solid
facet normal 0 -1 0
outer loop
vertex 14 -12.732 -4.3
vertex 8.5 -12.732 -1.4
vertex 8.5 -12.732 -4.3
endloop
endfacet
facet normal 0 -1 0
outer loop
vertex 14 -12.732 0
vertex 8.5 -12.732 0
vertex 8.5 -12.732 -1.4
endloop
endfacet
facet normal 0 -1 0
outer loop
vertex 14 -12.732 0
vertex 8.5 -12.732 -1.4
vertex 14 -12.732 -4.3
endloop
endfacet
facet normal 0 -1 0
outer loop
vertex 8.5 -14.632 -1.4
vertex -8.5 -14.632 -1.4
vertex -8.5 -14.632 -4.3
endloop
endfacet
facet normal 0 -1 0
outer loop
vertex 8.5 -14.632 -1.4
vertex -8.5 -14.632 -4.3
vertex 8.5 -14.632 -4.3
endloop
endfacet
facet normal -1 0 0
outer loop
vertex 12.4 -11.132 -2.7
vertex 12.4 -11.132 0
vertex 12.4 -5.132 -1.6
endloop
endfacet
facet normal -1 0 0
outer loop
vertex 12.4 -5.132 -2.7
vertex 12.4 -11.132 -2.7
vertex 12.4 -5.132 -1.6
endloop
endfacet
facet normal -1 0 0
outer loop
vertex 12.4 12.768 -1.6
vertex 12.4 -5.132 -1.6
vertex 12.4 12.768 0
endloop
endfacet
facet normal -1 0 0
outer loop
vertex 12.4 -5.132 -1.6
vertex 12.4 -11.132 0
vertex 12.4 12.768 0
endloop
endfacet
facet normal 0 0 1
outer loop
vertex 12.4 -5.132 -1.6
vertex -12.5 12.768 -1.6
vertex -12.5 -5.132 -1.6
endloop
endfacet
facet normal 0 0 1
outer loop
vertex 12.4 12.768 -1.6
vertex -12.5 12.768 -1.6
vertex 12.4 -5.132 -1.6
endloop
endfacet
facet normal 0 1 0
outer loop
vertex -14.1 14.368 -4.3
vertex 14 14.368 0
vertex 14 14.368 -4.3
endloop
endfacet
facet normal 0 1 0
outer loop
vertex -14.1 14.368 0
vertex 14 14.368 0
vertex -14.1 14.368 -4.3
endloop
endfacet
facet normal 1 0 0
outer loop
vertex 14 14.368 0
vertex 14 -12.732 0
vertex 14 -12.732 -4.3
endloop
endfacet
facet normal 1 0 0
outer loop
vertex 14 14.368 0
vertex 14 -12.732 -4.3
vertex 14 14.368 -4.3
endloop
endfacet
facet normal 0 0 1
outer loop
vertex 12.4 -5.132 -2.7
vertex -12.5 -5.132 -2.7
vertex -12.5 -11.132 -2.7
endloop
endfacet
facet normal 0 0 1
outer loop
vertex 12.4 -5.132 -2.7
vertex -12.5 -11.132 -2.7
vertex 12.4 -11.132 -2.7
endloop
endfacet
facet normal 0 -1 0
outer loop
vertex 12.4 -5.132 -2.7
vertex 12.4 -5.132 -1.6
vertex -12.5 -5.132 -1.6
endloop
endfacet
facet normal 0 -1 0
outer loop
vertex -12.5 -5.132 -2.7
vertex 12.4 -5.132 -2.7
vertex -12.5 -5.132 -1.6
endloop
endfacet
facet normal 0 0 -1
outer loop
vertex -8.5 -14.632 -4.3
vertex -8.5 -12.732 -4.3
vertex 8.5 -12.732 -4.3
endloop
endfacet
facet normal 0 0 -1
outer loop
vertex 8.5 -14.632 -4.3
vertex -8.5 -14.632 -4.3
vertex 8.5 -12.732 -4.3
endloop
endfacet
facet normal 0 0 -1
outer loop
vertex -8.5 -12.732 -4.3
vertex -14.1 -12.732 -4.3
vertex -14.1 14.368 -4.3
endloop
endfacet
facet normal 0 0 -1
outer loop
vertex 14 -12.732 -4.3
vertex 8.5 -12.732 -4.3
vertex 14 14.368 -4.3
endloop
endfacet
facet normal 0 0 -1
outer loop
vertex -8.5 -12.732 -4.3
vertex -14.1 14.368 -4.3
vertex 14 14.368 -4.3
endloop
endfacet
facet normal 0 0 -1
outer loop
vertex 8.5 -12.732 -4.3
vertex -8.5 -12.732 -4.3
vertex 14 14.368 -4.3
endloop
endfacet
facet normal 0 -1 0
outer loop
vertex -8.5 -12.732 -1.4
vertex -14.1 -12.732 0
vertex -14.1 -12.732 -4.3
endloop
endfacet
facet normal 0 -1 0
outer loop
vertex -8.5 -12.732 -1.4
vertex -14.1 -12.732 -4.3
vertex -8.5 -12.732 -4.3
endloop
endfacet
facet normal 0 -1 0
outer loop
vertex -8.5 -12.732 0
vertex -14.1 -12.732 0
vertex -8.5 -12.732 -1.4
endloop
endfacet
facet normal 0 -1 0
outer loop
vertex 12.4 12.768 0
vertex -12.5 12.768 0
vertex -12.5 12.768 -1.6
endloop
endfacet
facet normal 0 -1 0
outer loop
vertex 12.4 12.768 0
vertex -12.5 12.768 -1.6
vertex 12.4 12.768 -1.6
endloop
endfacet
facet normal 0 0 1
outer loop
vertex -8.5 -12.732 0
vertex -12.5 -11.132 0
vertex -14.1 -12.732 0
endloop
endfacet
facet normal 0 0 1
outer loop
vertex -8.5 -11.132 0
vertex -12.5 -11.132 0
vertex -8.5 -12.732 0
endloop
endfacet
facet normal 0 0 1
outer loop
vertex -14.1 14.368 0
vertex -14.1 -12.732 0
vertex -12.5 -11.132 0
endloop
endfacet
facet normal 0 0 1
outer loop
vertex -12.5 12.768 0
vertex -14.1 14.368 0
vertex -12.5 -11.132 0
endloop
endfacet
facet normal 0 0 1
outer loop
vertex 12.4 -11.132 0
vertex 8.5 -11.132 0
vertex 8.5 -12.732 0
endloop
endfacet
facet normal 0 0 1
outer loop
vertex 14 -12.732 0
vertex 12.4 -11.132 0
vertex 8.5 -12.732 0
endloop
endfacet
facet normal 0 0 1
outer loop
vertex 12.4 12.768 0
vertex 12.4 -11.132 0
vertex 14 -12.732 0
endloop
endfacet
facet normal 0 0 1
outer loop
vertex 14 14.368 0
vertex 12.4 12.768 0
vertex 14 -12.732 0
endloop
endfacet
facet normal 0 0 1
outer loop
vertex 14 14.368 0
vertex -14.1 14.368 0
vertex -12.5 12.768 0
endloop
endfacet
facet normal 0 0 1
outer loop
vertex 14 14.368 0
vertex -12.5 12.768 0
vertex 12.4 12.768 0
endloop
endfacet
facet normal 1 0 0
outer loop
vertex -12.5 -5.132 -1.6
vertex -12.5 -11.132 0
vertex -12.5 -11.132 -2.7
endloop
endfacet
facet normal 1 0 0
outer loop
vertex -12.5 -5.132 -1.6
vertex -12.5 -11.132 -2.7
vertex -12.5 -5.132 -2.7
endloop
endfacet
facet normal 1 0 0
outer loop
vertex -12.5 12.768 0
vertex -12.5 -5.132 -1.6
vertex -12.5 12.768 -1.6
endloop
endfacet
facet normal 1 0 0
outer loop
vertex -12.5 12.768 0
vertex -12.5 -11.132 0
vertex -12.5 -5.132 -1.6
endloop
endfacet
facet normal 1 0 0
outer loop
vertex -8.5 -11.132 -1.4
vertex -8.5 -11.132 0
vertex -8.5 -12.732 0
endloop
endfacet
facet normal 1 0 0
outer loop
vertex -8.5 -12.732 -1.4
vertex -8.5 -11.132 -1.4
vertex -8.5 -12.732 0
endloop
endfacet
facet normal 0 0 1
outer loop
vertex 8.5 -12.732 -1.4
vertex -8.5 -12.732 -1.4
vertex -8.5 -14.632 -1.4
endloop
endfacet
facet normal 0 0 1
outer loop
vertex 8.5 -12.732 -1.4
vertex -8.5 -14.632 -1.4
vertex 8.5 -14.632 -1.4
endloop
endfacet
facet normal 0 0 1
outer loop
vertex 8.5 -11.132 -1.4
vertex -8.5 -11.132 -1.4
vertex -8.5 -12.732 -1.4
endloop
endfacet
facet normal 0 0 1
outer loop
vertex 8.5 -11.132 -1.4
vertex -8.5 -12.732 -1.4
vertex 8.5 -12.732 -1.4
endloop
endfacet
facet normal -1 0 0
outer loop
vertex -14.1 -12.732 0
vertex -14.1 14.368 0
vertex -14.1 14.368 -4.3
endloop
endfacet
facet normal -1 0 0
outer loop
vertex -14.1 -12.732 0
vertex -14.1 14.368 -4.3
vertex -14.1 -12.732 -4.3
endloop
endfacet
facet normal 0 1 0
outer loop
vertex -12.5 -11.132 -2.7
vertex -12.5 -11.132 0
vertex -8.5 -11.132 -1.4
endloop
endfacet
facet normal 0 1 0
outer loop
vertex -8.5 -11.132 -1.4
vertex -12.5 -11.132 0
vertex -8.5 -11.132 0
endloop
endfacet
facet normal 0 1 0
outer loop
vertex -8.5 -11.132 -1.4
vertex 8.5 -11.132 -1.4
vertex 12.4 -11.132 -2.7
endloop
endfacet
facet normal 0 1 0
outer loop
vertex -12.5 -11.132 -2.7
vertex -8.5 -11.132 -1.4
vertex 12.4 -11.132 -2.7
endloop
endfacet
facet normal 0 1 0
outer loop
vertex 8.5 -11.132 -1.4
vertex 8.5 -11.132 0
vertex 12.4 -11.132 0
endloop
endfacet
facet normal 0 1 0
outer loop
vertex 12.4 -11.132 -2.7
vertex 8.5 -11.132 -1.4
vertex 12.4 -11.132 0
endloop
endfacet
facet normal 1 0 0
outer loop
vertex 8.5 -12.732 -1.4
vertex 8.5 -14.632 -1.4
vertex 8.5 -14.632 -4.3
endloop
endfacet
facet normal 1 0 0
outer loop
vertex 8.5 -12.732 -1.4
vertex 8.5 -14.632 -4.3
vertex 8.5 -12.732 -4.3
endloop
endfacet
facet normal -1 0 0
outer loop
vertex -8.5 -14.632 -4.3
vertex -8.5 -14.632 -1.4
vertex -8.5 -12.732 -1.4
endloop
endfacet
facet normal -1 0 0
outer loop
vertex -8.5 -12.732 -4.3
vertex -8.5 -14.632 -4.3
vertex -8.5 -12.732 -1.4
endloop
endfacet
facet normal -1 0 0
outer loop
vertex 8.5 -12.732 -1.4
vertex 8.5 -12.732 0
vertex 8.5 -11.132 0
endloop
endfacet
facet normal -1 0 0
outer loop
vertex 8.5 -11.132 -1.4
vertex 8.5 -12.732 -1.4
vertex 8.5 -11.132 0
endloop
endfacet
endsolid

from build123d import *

# Parameters (mm, degrees)
F0_W     = 24.9
F0_H     = 17.9
F0_W_2   = 17
F0_H_2   = 1.6
F0_H_3   = 1.9
F1_DEPTH = 4.3
F2_DEPTH = 2.7
F3_DEPTH = 1.6
F4_DEPTH = 1.4


with BuildPart() as f1:
    # F0 (on Top) → F1 (new body)
    with BuildSketch(Plane.XY):
        Polygon((14, -12.731579), (14, 14.368421), (-14.1, 14.368421), (-14.1, -12.731579), (-8.5, -12.731579), (-8.5, -11.131579), (-12.5, -11.131579), (-12.5, -5.131579), (-12.5, 12.768421), (12.4, 12.768421), (12.4, -5.131579), (12.4, -11.131579), (8.5, -11.131579), (8.5, -12.731579), align=None)
        with Locations((-0.05, 3.818421)):
            Rectangle(F0_W, F0_H)
        Polygon((-8.5, -11.131579), (8.5, -11.131579), (12.4, -11.131579), (12.4, -5.131579), (-12.5, -5.131579), (-12.5, -11.131579), align=None)
        with Locations((0, -11.931579)):
            Rectangle(F0_W_2, F0_H_2)
        with Locations((0, -13.681579)):
            Rectangle(F0_W_2, F0_H_3)
    extrude(amount=-F1_DEPTH)

    # F0 (on Top) → F2 (cut)
    with BuildSketch(Plane.XY):
        Polygon((-8.5, -11.131579), (8.5, -11.131579), (12.4, -11.131579), (12.4, -5.131579), (-12.5, -5.131579), (-12.5, -11.131579), align=None)
    extrude(amount=-F2_DEPTH, mode=Mode.SUBTRACT)

    # F0 (on Top) → F3 (cut)
    with BuildSketch(Plane.XY):
        with Locations((-0.05, 3.818421)):
            Rectangle(F0_W, F0_H)
    extrude(amount=-F3_DEPTH, mode=Mode.SUBTRACT)

    # F0 (on Top) → F4 (cut)
    with BuildSketch(Plane.XY):
        with Locations((0, -11.931579)):
            Rectangle(F0_W_2, F0_H_2)
        with Locations((0, -13.681579)):
            Rectangle(F0_W_2, F0_H_3)
    extrude(amount=-F4_DEPTH, mode=Mode.SUBTRACT)


solid = f1.part
